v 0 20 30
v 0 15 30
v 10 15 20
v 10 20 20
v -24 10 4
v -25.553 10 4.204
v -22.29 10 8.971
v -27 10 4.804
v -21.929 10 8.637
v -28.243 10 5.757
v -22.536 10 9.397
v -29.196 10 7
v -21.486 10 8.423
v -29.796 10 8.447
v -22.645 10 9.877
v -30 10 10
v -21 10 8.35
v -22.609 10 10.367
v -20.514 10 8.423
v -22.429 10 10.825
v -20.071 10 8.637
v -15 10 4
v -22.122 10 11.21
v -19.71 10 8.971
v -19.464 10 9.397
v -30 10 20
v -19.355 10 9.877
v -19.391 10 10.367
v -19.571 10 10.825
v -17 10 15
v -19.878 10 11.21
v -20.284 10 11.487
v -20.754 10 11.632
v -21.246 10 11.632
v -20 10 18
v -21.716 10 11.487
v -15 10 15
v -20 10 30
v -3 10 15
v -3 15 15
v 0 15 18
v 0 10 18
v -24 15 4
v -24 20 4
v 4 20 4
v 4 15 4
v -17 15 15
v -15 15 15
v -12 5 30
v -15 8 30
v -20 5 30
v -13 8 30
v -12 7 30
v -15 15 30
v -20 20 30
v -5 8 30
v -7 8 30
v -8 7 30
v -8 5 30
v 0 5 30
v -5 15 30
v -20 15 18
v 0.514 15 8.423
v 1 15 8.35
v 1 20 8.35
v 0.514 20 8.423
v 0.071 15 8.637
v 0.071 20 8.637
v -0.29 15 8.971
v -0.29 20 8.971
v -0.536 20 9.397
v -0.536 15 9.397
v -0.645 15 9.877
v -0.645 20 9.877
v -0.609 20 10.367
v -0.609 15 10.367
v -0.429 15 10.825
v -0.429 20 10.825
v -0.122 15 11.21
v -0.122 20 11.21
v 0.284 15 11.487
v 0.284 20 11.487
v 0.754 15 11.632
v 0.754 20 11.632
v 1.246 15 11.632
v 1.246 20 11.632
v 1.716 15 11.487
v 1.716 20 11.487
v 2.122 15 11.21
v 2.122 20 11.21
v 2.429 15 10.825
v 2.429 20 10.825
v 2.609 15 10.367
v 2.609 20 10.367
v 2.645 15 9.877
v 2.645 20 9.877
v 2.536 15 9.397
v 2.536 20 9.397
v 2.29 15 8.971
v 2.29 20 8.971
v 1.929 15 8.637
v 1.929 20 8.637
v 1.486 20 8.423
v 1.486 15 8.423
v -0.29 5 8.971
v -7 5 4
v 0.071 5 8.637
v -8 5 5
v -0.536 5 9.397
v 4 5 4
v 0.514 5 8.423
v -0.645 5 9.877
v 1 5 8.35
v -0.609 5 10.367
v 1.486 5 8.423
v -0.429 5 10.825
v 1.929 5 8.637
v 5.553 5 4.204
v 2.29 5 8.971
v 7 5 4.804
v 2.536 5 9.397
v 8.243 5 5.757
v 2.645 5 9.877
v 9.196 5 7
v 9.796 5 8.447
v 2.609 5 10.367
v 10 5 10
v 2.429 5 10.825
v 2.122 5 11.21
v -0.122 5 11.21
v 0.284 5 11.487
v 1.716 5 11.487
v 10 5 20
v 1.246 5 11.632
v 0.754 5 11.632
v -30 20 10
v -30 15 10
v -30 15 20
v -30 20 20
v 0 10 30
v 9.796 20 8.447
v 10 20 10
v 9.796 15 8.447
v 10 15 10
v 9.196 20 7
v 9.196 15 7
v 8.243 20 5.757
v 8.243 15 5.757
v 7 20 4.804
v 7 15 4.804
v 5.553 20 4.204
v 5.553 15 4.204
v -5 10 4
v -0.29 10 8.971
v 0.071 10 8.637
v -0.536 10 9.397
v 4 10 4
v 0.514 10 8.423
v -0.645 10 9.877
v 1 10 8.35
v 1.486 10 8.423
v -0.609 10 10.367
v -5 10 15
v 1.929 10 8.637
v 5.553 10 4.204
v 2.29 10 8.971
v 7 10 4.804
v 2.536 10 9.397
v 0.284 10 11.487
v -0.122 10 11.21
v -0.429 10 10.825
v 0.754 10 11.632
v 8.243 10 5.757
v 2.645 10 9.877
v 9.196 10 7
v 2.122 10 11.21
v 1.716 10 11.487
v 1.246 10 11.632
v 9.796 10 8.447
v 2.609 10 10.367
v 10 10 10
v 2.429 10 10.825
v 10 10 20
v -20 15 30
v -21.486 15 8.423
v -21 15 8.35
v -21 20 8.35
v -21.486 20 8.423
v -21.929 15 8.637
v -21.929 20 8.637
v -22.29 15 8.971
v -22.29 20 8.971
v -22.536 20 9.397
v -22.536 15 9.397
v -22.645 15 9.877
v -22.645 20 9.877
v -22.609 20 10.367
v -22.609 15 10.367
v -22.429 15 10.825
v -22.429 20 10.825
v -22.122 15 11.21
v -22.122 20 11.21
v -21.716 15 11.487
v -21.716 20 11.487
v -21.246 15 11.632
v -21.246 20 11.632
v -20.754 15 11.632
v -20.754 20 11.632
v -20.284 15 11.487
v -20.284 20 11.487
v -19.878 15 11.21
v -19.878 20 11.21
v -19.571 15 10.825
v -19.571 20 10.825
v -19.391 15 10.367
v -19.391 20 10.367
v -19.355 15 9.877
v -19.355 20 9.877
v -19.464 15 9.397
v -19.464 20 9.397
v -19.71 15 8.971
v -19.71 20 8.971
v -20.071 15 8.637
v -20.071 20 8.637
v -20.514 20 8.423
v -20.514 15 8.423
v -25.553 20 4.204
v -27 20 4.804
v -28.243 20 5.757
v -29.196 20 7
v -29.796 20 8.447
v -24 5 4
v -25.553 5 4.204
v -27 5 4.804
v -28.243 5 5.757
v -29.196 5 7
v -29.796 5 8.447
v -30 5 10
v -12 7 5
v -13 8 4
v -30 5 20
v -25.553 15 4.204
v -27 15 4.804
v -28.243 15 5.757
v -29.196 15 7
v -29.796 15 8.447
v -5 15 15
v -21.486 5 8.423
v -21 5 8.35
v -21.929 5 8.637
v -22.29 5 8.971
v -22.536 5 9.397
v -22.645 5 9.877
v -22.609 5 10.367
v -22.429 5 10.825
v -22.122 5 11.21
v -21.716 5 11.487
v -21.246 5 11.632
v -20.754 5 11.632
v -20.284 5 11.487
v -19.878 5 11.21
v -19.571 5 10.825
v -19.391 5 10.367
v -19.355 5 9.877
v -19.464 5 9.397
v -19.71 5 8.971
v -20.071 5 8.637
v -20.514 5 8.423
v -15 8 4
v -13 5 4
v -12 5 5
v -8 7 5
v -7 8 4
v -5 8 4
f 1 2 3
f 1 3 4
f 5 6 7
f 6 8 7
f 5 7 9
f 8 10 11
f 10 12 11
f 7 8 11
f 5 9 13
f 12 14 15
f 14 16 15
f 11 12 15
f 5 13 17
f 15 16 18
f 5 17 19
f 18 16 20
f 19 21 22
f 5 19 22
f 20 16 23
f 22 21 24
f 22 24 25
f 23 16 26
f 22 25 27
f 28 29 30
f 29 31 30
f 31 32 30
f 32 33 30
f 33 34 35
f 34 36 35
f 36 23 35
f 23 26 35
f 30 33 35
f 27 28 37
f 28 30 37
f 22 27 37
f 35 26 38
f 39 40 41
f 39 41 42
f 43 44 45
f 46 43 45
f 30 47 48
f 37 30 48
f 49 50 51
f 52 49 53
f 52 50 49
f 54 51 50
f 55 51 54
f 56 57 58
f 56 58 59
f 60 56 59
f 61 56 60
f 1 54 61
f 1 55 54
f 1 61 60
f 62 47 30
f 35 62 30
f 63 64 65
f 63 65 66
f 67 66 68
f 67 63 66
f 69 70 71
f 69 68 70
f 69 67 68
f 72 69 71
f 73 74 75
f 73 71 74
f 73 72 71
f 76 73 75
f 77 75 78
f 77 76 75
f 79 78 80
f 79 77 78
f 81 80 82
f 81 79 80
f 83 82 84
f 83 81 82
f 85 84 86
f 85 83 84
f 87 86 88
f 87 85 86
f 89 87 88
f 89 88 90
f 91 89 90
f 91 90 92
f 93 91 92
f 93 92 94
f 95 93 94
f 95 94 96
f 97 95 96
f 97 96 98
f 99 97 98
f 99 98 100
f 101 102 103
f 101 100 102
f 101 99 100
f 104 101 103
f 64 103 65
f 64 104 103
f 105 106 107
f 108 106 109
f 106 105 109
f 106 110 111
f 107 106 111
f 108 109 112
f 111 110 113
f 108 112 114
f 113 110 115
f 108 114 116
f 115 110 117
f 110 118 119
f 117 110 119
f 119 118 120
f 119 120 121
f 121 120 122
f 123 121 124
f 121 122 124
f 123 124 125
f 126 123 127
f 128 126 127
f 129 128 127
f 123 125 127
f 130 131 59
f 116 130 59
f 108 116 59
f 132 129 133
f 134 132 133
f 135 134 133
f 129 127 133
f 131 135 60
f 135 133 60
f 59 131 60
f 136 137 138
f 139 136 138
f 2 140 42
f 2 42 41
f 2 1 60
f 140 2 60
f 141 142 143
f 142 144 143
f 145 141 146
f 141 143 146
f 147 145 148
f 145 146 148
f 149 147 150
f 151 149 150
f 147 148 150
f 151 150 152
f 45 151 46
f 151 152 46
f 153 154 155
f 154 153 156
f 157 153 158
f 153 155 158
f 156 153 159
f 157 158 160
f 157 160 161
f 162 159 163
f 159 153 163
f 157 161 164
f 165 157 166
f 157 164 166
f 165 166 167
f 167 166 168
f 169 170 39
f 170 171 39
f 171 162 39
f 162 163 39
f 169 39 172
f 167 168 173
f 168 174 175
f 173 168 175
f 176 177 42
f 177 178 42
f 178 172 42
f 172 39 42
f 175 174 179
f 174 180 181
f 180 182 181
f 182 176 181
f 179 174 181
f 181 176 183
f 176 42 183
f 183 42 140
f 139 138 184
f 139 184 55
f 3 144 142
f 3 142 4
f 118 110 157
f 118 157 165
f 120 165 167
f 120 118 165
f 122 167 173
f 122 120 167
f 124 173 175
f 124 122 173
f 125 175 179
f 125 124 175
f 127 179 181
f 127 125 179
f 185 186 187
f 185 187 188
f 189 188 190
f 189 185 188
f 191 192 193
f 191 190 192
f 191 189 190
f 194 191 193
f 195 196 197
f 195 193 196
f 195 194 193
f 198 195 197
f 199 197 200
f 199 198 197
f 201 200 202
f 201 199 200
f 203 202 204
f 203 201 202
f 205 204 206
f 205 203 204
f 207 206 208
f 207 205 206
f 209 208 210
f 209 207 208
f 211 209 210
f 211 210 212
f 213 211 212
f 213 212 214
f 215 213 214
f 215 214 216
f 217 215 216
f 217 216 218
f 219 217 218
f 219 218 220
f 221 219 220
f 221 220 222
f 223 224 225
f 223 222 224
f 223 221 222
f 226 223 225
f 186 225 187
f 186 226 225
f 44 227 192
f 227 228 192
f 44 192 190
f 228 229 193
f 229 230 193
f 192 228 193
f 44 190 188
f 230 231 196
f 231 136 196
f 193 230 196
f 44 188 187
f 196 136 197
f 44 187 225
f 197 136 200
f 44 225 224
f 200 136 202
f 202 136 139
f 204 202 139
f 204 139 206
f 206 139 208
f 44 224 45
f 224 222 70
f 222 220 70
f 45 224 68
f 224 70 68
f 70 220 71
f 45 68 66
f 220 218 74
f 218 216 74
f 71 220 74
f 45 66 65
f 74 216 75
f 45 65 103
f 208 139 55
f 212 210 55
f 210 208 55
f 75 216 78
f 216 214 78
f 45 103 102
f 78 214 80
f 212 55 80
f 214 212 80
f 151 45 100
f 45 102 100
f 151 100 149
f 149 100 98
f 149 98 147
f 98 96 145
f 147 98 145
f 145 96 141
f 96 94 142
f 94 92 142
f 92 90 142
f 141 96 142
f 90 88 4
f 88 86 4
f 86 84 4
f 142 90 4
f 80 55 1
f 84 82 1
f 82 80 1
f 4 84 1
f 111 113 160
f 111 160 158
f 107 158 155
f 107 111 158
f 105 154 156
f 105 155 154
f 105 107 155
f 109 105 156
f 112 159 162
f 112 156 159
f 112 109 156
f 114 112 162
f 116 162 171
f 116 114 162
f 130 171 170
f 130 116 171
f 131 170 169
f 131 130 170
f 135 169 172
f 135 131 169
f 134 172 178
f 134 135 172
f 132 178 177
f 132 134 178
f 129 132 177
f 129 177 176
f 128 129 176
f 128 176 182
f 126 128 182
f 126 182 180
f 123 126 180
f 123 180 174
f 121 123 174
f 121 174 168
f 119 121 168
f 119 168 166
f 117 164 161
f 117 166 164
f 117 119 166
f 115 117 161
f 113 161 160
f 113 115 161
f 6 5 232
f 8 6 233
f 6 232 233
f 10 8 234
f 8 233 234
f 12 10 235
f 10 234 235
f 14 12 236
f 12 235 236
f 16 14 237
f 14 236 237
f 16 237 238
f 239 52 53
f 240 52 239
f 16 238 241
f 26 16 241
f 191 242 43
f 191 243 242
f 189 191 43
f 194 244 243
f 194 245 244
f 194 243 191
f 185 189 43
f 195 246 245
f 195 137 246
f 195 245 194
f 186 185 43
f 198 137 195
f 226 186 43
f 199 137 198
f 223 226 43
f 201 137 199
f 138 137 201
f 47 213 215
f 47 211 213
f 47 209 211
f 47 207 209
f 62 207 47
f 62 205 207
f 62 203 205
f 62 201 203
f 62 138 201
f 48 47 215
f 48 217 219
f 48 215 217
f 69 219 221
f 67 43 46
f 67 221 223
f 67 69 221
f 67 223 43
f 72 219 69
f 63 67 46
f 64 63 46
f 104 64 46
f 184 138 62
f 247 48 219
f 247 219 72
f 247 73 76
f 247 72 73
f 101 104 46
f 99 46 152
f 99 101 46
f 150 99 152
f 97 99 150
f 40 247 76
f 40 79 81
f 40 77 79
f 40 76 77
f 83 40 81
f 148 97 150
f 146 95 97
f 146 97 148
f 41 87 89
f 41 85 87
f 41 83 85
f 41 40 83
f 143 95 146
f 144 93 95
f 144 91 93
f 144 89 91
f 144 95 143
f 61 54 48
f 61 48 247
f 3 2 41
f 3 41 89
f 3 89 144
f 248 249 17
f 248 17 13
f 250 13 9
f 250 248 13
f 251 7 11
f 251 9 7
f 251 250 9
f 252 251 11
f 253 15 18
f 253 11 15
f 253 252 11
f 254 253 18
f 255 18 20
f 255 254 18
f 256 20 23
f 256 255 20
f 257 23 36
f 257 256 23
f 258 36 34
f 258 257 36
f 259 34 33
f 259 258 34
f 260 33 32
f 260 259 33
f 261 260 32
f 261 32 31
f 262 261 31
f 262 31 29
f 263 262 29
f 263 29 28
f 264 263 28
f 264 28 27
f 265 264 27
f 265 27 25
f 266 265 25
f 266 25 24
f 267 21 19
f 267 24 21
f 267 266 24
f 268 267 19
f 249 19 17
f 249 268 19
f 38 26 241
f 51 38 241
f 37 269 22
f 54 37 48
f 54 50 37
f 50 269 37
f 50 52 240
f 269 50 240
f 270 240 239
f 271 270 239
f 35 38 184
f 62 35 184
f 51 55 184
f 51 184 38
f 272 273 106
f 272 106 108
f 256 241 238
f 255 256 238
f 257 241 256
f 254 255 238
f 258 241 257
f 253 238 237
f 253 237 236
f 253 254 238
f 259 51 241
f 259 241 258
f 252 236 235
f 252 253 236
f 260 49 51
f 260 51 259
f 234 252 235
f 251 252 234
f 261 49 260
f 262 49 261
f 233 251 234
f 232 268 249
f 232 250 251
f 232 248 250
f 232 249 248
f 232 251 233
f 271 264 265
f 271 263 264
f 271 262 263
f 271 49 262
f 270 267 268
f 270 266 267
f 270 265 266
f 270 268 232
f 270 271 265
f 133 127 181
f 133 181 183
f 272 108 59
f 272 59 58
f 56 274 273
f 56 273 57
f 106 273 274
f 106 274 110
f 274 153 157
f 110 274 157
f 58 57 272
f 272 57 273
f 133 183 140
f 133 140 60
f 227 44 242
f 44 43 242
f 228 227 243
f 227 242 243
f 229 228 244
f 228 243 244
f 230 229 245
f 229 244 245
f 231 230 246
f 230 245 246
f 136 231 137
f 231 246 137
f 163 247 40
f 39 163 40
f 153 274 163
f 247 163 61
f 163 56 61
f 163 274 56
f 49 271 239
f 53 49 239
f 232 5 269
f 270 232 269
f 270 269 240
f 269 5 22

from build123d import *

# Parameters (mm, degrees)
SKETCH_1_W                = 20
SKETCH_1_H                = 20
SKETCH_1_W_2              = 10
SKETCH_1_H_2              = 10
EXTRUDE_1_DEPTH           = 30
EXTRUDE_1_2_DEPTH         = 20
EXTRUDE_1_2_DEPTH_BACK    = 40
SKETCH_2_W                = 20
SKETCH_2_H                = 20
SKETCH_5_W                = 20
SKETCH_5_H                = 10
CUT_EXTRUDE_1_DEPTH       = 35
SKETCH_6_R                = 1.5
CUT_EXTRUDE_2_DEPTH       = 35
SKETCH_7_W                = 10
SKETCH_7_H                = 10
CUT_EXTRUDE_3_DEPTH       = 35
SKETCH_8_W                = 20
SKETCH_8_H                = 20
CUT_EXTRUDE_4_DEPTH       = 23
SKETCH_10_W               = 20
SKETCH_10_H               = 20
CUT_EXTRUDE_5_DEPTH       = 5
CHAMFER_1_SIZE            = 10
SKETCH_12_W               = 20
SKETCH_12_H               = 15
CUT_EXTRUDE_6_DEPTH       = 5
SKETCH_13_W               = 10
SKETCH_13_H               = 20
CUT_EXTRUDE_7_DEPTH       = 5
SKETCH_14_W               = 40
SKETCH_14_H               = 20
EXTRUDE_4_DEPTH           = 10
SKETCH_15_W               = 10
SKETCH_15_H               = 5
CUT_EXTRUDE_8_DEPTH       = 37
CHAMFER_2_SIZE            = 10
CUT_EXTRUDE_9_DEPTH       = 37
CUT_EXTRUDE_9_DEPTH_BACK  = 10
SKETCH_16_R               = 1.65
SKETCH_18_W               = 40
SKETCH_18_H               = 4
CUT_EXTRUDE_10_DEPTH      = 35
SKETCH_19_W               = 10
SKETCH_19_H               = 8
EXTRUDE_5_DEPTH           = 10
SKETCH_20_R               = 1.5
CUT_EXTRUDE_11_DEPTH      = 30
FILLET_1_R                = 6
SKETCH_21_W               = 10
SKETCH_21_H               = 12
CUT_EXTRUDE_12_DEPTH      = 1
CUT_EXTRUDE_13_DEPTH      = 18
CUT_EXTRUDE_13_DEPTH_BACK = 5
SKETCH_23_W               = 60.486113846
SKETCH_23_H               = 38.876717581
SKETCH_24_W               = 3
SKETCH_24_H               = 3
EXTRUDE_6_DEPTH           = 25
CHAMFER_3_SIZE            = 3
CHAMFER_4_SIZE            = 1
CHAMFER_5_SIZE            = 3


# Some blends are built 0.0001 mm under size
with BuildPart() as part:
    # 草图1 → Extrude 1 (new body)
    with BuildSketch(Plane.XY):
        with Locations((-10, 10)):
            Rectangle(SKETCH_1_W, SKETCH_1_H)
        with Locations((-10, 10)):
            Rectangle(SKETCH_1_W_2, SKETCH_1_H_2, mode=Mode.SUBTRACT)
    extrude(amount=EXTRUDE_1_DEPTH)

    # 草图2 → Extrude 1 2 (add, two sides: drawn at the far end of the back side and taken through both)
    with BuildSketch(Plane(origin=(0, 0, 0), x_dir=(0, 0, -1), z_dir=(1, 0, 0)).offset(-EXTRUDE_1_2_DEPTH_BACK)):
        with Locations((-10, 20)):
            Rectangle(SKETCH_2_W, SKETCH_2_H)
    extrude(amount=EXTRUDE_1_2_DEPTH + EXTRUDE_1_2_DEPTH_BACK)

    # 草图5 → 切除-拉伸1 (cut)
    with BuildSketch(Plane.XY.offset(20)):
        with Locations((-30, 25)):
            Rectangle(SKETCH_5_W, SKETCH_5_H)
        with Locations((10, 25)):
            Rectangle(SKETCH_5_W, SKETCH_5_H)
    extrude(amount=-CUT_EXTRUDE_1_DEPTH, mode=Mode.SUBTRACT)

    # 草图6 → 切除-拉伸2 (cut)
    with BuildSketch(Plane(origin=(0, 30, 0), x_dir=(1, 0, 0), z_dir=(0, 1, 0))):
        with Locations(Location((-21, -10, 0), (0, 0, 311.810314896))):
            Circle(SKETCH_6_R)
        with Locations(Location((1, -10, 0), (0, 0, 228.189685104))):
            Circle(SKETCH_6_R)
    extrude(amount=-CUT_EXTRUDE_2_DEPTH, mode=Mode.SUBTRACT)

    # 草图7 → 切除-拉伸3 (cut)
    with BuildSketch(Plane.XY.offset(30)):
        with Locations((-10, 10)):
            Rectangle(SKETCH_7_W, SKETCH_7_H)
    extrude(amount=-CUT_EXTRUDE_3_DEPTH, mode=Mode.SUBTRACT)

    # 草图8 → 切除-拉伸4 (cut)
    with BuildSketch(Plane(origin=(0, 20, 0), x_dir=(1, 0, 0), z_dir=(0, 1, 0))):
        with Locations((-10, -10)):
            Rectangle(SKETCH_8_W, SKETCH_8_H)
    extrude(amount=CUT_EXTRUDE_4_DEPTH, mode=Mode.SUBTRACT)

    # 草图10 → 切除-拉伸5 (cut)
    with BuildSketch(Plane.XZ.offset(-10)):
        with Locations((-30, 10)):
            Rectangle(SKETCH_10_W, SKETCH_10_H)
        with Locations((10, 10)):
            Rectangle(SKETCH_10_W, SKETCH_10_H)
    extrude(amount=-CUT_EXTRUDE_5_DEPTH, mode=Mode.SUBTRACT)

    # 倒角1
    chamfer_1_edges = [part.edges().sort_by_distance(p)[0] for p in [
        (0, 17.5, 20),
        (-20, 17.5, 20),
    ]]
    chamfer(chamfer_1_edges, length=CHAMFER_1_SIZE - 0.0001)  # a hair under: the kernel refuses the full size

    # 草图12 → 切除-拉伸6 (cut)
    with BuildSketch(Plane.XZ.offset(-15)):
        with Locations((-10, 7.5)):
            Rectangle(SKETCH_12_W, SKETCH_12_H)
    extrude(amount=CUT_EXTRUDE_6_DEPTH, mode=Mode.SUBTRACT)

    # 草图13 → 切除-拉伸7 (cut)
    with BuildSketch(Plane.XZ.offset(-15)):
        with Locations((-35, 10)):
            Rectangle(SKETCH_13_W, SKETCH_13_H)
        with Locations((15, 10)):
            Rectangle(SKETCH_13_W, SKETCH_13_H)
    extrude(amount=-CUT_EXTRUDE_7_DEPTH, mode=Mode.SUBTRACT)

    # 草图14 → 凸台-拉伸4 (add)
    with BuildSketch(Plane.XZ):
        with Locations((-10, 10)):
            Rectangle(SKETCH_14_W, SKETCH_14_H)
    extrude(amount=-EXTRUDE_4_DEPTH)

    # 草图15 → 切除-拉伸8 (cut)
    with BuildSketch(Plane.XY.offset(30)):
        with Locations((-10, 7.5)):
            Rectangle(SKETCH_15_W, SKETCH_15_H)
    extrude(amount=-CUT_EXTRUDE_8_DEPTH, mode=Mode.SUBTRACT)

    # 倒角2
    chamfer_2_edges = [part.edges().sort_by_distance(p)[0] for p in [
        (0, 5, 20),
        (-20, 5, 20),
    ]]
    chamfer(chamfer_2_edges, length=CHAMFER_2_SIZE - 0.0001)  # a hair under: the kernel refuses the full size

    # 草图16 → 切除-拉伸9 (cut, two sides: drawn at the far end of the back side and taken through both)
    with BuildSketch(Plane(origin=(0, 10, 0), x_dir=(1, 0, 0), z_dir=(0, 1, 0)).offset(-CUT_EXTRUDE_9_DEPTH_BACK)):
        with Locations(Location((-21, -10, 0), (0, 0, 90))):
            Circle(SKETCH_16_R)
        with Locations(Location((1, -10, 0), (0, 0, 90))):
            Circle(SKETCH_16_R)
    extrude(amount=CUT_EXTRUDE_9_DEPTH + CUT_EXTRUDE_9_DEPTH_BACK, mode=Mode.SUBTRACT)

    # 草图18 → 切除-拉伸10 (cut)
    with BuildSketch(Plane(origin=(0, 20, 0), x_dir=(1, 0, 0), z_dir=(0, 1, 0))):
        with Locations((-10, -2)):
            Rectangle(SKETCH_18_W, SKETCH_18_H)
    extrude(amount=-CUT_EXTRUDE_10_DEPTH, mode=Mode.SUBTRACT)

    # 草图19 → 凸台-拉伸5 (add)
    with BuildSketch(Plane.XZ):
        with Locations((-10, 20)):
            Rectangle(SKETCH_19_W, SKETCH_19_H)
    extrude(amount=EXTRUDE_5_DEPTH)

    # 草图20 → 切除-拉伸11 (cut)
    with BuildSketch(Plane.ZY.offset(15)):
        with Locations((20, -3)):
            Circle(SKETCH_20_R)
    extrude(amount=-CUT_EXTRUDE_11_DEPTH, mode=Mode.SUBTRACT)

    # 圆角1
    fillet_1_edges = [part.edges().sort_by_distance(p)[0] for p in [
        (-30, 5, 4),
        (10, 5, 4),
        (-30, 17.5, 4),
        (10, 17.5, 4),
    ]]
    fillet(fillet_1_edges, radius=FILLET_1_R)

    # 草图21 → 切除-拉伸12 (cut)
    with BuildSketch(Plane.XZ):
        with Locations((-10, 10)):
            Rectangle(SKETCH_21_W, SKETCH_21_H)
    extrude(amount=-CUT_EXTRUDE_12_DEPTH, mode=Mode.SUBTRACT)

    # 草图23 → 切除-拉伸13 (cut, two sides: drawn at the far end of the back side and taken through both)
    with BuildSketch(Plane.XZ.offset(-CUT_EXTRUDE_13_DEPTH_BACK)):
        with Locations((-10.757338654, 16.810917803)):
            Rectangle(SKETCH_23_W, SKETCH_23_H)
    extrude(amount=CUT_EXTRUDE_13_DEPTH + CUT_EXTRUDE_13_DEPTH_BACK, mode=Mode.SUBTRACT)

    # 草图24 → 凸台-拉伸6 (add)
    with BuildSketch(Plane.XY.offset(30)):
        with Locations((-13.5, 6.5)):
            Rectangle(SKETCH_24_W, SKETCH_24_H)
        with Locations((-6.5, 6.5)):
            Rectangle(SKETCH_24_W, SKETCH_24_H)
    extrude(amount=-EXTRUDE_6_DEPTH)

    # 倒角3
    # the kernel refuses this chamfer: 3 mm, written as the material it adds along each edge
    with BuildSketch(Plane(origin=(-5, 8, 5), x_dir=(0.02749587661058649, 0, -0.9996219169112968), z_dir=(0, -1, 0))) as chamfer_3_piece_1_section:
        Polygon((CHAMFER_3_SIZE * 0.999621916911, -CHAMFER_3_SIZE * 0.0274958766106), (-CHAMFER_3_SIZE * 0.0274958766106, -CHAMFER_3_SIZE * 0.999621916911), (0, 0), align=None)
    chamfer_3_piece_1 = extrude(amount=3, mode=Mode.PRIVATE)
    chamfer_3_piece_1 = split(chamfer_3_piece_1, bisect_by=Plane(origin=(-6.280814641, 6.5, 4), z_dir=(0, 0, 1)), keep=Keep.TOP, mode=Mode.PRIVATE)
    chamfer_3_piece_1 = split(chamfer_3_piece_1, bisect_by=Plane(origin=(-8, 6.5, 4.572987798), z_dir=(1, 0, 0)), keep=Keep.TOP, mode=Mode.PRIVATE)
    add(chamfer_3_piece_1)
    with BuildSketch(Plane(origin=(-15, 8, 5), x_dir=(-0.027495876610586202, 0, -0.9996219169112968), z_dir=(0, -1, 0))) as chamfer_3_piece_2_section:
        Polygon((CHAMFER_3_SIZE * 0.999621916911, CHAMFER_3_SIZE * 0.0274958766106), (-CHAMFER_3_SIZE * 0.0274958766106, CHAMFER_3_SIZE * 0.999621916911), (0, 0), align=None)
    chamfer_3_piece_2 = extrude(amount=3, mode=Mode.PRIVATE)
    chamfer_3_piece_2 = split(chamfer_3_piece_2, bisect_by=Plane(origin=(-13.719185359, 6.5, 4), z_dir=(0, 0, 1)), keep=Keep.TOP, mode=Mode.PRIVATE)
    chamfer_3_piece_2 = split(chamfer_3_piece_2, bisect_by=Plane(origin=(-12, 6.5, 4.572987798), z_dir=(-1, 0, 0)), keep=Keep.TOP, mode=Mode.PRIVATE)
    add(chamfer_3_piece_2)

    # 倒角4
    chamfer_4_edges = [part.edges().sort_by_distance(p)[0] for p in [
        (-12, 8, 17.5),
        (-8, 8, 17.5),
    ]]
    chamfer(chamfer_4_edges, length=CHAMFER_4_SIZE)

    # 倒角5
    chamfer_5_edges = [part.edges().sort_by_distance(p)[0] for p in [
        (0, 12.5, 15),
        (-20, 12.5, 15),
    ]]
    chamfer(chamfer_5_edges, length=CHAMFER_5_SIZE)


solid = part.part
